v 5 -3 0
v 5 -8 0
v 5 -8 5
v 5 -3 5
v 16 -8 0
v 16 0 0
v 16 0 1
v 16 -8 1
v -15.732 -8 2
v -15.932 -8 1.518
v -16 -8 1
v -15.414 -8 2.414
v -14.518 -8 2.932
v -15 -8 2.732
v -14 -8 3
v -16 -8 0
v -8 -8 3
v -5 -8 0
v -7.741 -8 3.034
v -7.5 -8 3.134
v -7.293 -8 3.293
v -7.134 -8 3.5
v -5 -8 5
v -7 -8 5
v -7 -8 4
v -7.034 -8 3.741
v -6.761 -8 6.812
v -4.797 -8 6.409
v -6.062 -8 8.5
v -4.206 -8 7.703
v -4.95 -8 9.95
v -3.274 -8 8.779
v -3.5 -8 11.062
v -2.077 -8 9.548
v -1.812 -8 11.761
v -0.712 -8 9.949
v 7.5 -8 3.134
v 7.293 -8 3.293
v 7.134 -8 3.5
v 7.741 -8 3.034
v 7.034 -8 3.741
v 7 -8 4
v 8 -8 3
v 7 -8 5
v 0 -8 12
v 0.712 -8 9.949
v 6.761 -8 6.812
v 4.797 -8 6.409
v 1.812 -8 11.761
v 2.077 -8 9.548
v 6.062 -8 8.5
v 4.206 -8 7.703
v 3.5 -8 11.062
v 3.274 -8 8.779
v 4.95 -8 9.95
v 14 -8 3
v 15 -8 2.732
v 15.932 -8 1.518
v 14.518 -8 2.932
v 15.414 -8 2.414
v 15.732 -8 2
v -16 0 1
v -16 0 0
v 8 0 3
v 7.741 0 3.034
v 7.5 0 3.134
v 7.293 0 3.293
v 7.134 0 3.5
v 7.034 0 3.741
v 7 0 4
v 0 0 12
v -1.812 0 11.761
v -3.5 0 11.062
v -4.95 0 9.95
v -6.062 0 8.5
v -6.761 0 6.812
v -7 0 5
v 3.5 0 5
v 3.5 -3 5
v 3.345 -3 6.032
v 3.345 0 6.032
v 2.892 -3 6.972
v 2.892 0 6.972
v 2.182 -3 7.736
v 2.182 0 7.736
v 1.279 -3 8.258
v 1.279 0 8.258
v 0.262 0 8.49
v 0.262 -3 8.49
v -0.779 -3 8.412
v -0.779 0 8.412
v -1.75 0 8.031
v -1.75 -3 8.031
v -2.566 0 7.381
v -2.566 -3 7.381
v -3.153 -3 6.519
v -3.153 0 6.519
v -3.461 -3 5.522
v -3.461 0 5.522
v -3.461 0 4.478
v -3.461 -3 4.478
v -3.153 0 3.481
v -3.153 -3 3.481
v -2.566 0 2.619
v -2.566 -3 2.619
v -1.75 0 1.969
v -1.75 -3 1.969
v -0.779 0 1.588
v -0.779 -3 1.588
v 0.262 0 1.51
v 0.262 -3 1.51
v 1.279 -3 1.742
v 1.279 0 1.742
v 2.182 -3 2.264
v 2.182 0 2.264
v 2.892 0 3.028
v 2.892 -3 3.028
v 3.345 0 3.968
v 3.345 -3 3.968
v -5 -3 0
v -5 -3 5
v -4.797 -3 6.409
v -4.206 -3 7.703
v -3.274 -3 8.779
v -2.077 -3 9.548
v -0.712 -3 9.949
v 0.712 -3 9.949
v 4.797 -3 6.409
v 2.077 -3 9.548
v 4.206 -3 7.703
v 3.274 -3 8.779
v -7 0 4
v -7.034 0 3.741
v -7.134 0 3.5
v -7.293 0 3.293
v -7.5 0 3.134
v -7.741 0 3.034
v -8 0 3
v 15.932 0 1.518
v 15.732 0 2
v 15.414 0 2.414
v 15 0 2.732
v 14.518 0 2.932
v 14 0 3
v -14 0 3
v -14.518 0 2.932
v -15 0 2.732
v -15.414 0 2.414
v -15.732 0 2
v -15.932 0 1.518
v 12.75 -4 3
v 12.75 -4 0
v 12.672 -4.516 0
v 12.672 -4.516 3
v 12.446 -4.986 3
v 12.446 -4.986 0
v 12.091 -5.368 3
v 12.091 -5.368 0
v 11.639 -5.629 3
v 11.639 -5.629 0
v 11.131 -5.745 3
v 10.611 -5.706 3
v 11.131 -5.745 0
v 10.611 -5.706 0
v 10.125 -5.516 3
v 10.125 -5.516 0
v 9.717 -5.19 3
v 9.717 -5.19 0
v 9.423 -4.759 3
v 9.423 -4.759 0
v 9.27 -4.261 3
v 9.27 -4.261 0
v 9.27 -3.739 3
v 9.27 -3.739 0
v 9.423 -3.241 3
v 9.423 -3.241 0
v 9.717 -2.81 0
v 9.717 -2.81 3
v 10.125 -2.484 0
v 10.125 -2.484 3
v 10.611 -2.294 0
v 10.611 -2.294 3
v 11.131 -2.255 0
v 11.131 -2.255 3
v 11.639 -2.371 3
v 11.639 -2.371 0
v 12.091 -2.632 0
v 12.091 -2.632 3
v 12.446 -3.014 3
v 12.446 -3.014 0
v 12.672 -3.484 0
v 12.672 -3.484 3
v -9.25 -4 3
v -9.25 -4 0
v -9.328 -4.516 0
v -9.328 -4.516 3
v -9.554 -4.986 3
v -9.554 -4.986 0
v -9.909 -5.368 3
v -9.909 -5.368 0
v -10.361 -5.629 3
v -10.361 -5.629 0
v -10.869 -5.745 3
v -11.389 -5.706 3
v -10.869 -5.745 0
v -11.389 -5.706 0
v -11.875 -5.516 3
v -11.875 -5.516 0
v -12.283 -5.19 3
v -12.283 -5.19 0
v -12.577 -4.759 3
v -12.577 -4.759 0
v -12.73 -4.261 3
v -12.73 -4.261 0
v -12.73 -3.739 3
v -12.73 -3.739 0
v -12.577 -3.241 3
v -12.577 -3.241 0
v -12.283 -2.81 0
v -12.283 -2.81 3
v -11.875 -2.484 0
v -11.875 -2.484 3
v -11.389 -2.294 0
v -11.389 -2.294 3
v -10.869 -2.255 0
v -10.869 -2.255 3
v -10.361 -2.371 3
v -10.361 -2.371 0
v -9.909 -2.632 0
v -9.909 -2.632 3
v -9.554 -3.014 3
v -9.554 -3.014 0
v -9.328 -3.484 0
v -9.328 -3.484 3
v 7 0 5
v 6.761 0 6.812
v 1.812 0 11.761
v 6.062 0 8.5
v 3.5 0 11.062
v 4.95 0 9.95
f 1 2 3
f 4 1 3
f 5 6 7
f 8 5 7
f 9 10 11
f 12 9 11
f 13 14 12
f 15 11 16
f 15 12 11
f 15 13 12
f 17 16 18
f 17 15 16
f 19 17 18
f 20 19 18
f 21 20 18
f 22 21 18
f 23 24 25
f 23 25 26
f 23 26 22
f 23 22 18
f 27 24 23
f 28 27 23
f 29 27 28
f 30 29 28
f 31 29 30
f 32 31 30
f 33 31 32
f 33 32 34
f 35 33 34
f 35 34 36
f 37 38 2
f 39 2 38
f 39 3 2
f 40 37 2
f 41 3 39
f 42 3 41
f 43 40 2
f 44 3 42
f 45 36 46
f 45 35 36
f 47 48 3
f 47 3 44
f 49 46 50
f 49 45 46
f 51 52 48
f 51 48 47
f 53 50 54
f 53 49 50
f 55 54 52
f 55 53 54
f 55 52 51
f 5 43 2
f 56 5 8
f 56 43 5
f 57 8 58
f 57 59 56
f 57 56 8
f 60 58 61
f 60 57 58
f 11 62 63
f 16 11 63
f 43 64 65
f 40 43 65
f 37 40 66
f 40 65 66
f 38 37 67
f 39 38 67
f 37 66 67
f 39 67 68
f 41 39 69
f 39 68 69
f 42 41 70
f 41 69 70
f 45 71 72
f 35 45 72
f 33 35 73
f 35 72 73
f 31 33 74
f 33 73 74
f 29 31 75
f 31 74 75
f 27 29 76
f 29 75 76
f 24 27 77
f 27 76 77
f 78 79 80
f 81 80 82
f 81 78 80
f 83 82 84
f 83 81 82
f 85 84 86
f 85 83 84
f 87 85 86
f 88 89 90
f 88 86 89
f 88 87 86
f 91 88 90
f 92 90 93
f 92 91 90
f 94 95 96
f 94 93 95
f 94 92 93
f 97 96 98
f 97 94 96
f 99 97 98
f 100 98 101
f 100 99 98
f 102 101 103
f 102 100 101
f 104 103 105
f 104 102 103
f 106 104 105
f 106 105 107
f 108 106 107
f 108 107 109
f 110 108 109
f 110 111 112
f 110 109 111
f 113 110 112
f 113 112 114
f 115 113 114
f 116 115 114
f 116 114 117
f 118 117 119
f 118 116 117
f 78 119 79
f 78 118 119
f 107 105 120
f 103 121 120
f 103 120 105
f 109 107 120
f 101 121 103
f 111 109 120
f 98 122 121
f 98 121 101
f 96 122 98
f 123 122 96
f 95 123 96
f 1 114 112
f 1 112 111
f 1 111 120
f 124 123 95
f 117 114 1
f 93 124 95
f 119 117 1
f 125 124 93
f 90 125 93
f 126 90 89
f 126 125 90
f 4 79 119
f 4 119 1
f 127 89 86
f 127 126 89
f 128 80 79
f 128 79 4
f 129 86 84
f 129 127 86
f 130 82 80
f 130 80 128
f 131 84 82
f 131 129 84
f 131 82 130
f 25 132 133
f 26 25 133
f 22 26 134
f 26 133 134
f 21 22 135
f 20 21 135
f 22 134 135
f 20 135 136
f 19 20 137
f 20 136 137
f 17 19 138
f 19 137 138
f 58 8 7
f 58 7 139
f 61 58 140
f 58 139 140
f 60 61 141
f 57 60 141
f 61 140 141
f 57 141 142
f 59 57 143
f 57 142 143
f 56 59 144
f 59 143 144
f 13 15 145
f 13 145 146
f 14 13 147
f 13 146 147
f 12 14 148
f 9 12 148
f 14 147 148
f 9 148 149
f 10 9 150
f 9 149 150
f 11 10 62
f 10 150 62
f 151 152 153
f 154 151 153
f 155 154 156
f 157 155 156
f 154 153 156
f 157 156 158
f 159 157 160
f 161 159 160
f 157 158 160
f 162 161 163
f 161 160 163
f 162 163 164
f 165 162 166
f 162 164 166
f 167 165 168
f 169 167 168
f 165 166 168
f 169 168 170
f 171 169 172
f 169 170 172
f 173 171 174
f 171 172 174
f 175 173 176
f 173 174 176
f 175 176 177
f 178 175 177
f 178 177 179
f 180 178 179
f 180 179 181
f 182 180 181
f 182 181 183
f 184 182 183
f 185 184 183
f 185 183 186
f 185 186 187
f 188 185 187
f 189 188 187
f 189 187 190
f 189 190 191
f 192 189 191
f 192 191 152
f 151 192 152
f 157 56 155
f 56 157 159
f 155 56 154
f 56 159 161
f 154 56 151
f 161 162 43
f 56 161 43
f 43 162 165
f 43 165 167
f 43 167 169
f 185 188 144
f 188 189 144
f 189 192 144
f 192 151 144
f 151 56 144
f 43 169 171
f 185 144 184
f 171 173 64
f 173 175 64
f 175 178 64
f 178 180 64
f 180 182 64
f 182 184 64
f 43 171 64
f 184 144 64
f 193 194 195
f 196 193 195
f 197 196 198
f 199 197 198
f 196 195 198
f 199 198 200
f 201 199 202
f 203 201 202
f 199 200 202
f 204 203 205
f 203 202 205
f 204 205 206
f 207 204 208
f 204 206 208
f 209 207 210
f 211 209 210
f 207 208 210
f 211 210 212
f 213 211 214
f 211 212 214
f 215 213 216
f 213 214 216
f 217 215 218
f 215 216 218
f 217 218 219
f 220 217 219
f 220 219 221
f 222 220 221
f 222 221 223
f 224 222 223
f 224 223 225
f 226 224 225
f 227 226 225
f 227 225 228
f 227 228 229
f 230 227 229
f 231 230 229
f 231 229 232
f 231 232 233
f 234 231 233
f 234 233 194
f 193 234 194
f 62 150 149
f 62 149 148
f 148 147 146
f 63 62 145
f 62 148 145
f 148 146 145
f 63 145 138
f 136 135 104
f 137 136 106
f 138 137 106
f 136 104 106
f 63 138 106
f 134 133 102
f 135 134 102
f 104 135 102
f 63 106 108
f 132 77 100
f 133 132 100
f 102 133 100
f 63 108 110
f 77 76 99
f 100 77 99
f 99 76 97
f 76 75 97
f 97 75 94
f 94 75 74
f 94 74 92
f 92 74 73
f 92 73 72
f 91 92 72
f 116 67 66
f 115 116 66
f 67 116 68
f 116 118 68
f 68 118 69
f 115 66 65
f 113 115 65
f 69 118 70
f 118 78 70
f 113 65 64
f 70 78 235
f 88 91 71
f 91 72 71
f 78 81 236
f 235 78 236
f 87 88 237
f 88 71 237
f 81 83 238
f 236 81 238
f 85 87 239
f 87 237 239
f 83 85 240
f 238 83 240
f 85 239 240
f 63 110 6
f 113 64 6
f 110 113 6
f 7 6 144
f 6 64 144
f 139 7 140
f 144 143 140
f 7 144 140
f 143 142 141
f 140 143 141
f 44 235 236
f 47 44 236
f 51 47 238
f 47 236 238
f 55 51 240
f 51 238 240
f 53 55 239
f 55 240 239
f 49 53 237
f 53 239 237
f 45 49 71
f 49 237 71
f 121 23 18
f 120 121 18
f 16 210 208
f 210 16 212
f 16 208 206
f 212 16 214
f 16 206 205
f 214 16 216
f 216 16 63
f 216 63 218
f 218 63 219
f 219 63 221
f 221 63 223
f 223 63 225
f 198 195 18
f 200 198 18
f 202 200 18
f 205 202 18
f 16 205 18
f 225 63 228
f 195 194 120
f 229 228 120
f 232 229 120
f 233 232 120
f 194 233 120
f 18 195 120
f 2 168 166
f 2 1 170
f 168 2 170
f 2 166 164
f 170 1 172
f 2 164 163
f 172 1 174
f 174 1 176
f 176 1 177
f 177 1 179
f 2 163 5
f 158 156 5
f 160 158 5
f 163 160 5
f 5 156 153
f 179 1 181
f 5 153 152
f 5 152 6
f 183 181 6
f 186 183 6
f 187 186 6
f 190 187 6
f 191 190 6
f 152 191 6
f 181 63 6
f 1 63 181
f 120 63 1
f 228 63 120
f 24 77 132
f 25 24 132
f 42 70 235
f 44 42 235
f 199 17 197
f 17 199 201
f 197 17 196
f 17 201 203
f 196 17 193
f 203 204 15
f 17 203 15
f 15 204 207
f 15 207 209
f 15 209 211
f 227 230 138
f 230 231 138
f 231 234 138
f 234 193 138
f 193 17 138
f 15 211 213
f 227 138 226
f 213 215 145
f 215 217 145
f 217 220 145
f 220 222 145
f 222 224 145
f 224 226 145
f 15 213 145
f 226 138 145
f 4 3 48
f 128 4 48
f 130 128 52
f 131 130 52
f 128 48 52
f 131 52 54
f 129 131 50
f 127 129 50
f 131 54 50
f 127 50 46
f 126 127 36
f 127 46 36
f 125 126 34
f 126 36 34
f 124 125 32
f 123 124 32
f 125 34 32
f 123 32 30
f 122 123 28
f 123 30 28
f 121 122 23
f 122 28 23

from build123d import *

# Parameters (mm, degrees)
F0_R     = 3.5
F1_DEPTH = 8
F2_R     = 1.75
F3_DEPTH = 12.001
F5_DEPTH = 5


with BuildPart() as f1:
    # F0 (on Front) → F1 (new body)
    with BuildSketch(Plane.XZ):
        with BuildLine():
            Line((-16, 1), (-16, 0))
            Line((-16, 0), (16, 0))
            Line((16, 0), (16, 1))
            ThreePointArc((16, 1), (15.414214, 2.414214), (14, 3))
            Line((14, 3), (8, 3))
            ThreePointArc((8, 3), (7.292893, 3.292893), (7, 4))
            Line((7, 4), (7, 5))
            ThreePointArc((7, 5), (4.949747, 9.949747), (0, 12))
            ThreePointArc((0, 12), (-4.949747, 9.949747), (-7, 5))
            Line((-7, 5), (-7, 4))
            ThreePointArc((-7, 4), (-7.292893, 3.292893), (-8, 3))
            Line((-8, 3), (-14, 3))
            ThreePointArc((-14, 3), (-15.414214, 2.414214), (-16, 1))
        make_face()
        with Locations((0, 5)):
            Circle(F0_R, mode=Mode.SUBTRACT)
    extrude(amount=F1_DEPTH)

    # F2 (on face) → F3 (cut, through all)
    with BuildSketch(Plane(origin=(0, 0, 0), x_dir=(1, 0, 0), z_dir=(0, 0, -1))):
        with Locations((-11, 4)):
            Circle(F2_R)
        with Locations((11, 4)):
            Circle(F2_R)
    extrude(amount=-F3_DEPTH, mode=Mode.SUBTRACT)

    # F4 (on face) → F5 (cut)
    with BuildSketch(Plane.XZ.offset(8)):
        with BuildLine():
            Line((5, 0), (5, 5))
            ThreePointArc((5, 5), (0, 10), (-5, 5))
            Line((-5, 5), (-5, 0))
            Line((-5, 0), (5, 0))
        make_face()
    extrude(amount=-F5_DEPTH, mode=Mode.SUBTRACT)


solid = f1.part
